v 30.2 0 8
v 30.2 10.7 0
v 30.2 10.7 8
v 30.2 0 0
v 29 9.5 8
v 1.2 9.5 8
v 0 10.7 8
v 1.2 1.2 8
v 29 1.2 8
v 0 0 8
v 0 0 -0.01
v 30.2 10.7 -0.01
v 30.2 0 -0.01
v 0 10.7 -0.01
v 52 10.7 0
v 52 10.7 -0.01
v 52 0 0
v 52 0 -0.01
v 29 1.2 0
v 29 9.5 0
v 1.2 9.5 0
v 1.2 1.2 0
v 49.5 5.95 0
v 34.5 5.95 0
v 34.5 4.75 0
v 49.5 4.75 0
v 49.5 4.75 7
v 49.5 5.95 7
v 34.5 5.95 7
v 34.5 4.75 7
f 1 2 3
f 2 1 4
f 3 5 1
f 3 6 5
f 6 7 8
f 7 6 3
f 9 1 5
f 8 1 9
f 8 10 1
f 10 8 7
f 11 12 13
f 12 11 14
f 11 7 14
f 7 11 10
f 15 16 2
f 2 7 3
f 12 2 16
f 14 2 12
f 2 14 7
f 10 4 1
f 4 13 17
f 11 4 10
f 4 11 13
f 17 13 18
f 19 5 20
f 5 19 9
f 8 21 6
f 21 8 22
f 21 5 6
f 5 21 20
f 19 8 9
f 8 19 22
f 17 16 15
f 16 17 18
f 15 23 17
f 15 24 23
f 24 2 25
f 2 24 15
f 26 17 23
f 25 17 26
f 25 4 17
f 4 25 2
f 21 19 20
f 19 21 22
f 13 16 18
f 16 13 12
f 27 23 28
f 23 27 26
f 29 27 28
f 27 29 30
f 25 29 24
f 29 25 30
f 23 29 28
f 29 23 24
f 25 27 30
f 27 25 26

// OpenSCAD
// file: ../Base/Boxes.scad
// Fischertechnik Box Foundation
// Pre-designed Boxes

use <Constants.scad>

include <PlacementOptions.scad>

box190Width = 190;
box190Depth = 130;
box130Width = 130;
box130Depth = 95;
boxUsageHeight = 33.9;
boxWallThickness = 2.4;
boxBaseThickness = 1.0;
boxWebWidth = 3.0;

// getBoxWallThickness()
// Gets the wall thickness of a Fischertechnik Box

function getBoxWallThickness() = boxWallThickness;

// Gets the usable height of a fischertechnik box
function getBoxUsageHeight() = boxUsageHeight;

// Gets the thickness of the Fischertechnik box base.
function getBoxBaseThickness() = boxBaseThickness;

// Gets the width of a box web
function getBoxWebWidth() = boxWebWidth;

// Gets the usable inner space of a Box 190 as an x/y-list
function getBox190Space() = [
    box190Width - 2*getBoxWallThickness(), 
    box190Depth - 2*getBoxWallThickness() ];

// Imports the Fischertechnik empty box 130x190 mm and places it at position 0,0
// 190x130 are the outer sizes, the inner space is slightly smaller. Use getBox190Space() to get the inner sizes.
// This module needs the STL file "Fischertechnik Box 130x190.stl" in the library path.
// The box is positioned that the usable inner space is at the 0,0,0 position. The

module Box190() {
    translate([-getBoxWallThickness(),-getBoxWallThickness(),-getBoxBaseThickness()])
        import("Fischertechnik Box 130x190.stl", convexity=3);
}

// Gets the usable inner space of a Box 130 as an x/y-list
function getBox130Space() = [
    box130Width - 2*getBoxWallThickness(), 
    box130Depth - 2*getBoxWallThickness() ];

// Imports the Fischertechnik empty box 95x130 mm and places it at position 0,0
// 190x130 are the outer sizes, the inner space is slightly smaller. Use getBox190Space() to get the inner sizes.
// This module needs the STL file "Fischertechnik Box 95x130.stl" in the library path.
// The box is positioned that the usable inner space is at the 0,0,0 position. The

module Box130() {
    translate([-getBoxWallThickness(),-getBoxWallThickness(),-getBoxBaseThickness()])
        import("Fischertechnik Box 95x130.stl", convexity=3);
}

// Creates a web at the specified box walls
// corner 0 = LowerLeft, 1 = UpperLeft, 2 = UpperRight, 3 = LowerRight
// side 0 = LeftOfCorner, 1 = RightOfCorner
// distance = Distance in mm from the corner
// box = inner width and depth of the box (default: Box 190)
// webWidth = length of the web (default is 3 mms)
// webThickness = thickness of the web (default is 1 mm)

module BoxWeb(corner, side, distance, box=getBox190Space(), webWidth=getBoxWebWidth(), webThickness=1.0) {
    sink = getBoxWallThickness()/2;

    width = (corner % 2 == 0) ? 
            (side == LeftOfCorner ? webWidth : webThickness) :
            (side == LeftOfCorner ? webThickness : webWidth);

    depth = (corner % 2 == 0) ? 
            (side == RightOfCorner ? webWidth : webThickness) :
            (side == RightOfCorner ? webThickness : webWidth);
    
    xDiff = corner == LowerLeft ? 
                (side == LeftOfCorner ? -sink : distance) :
            (corner == UpperLeft ?                
                (side == LeftOfCorner ? distance : -sink) :
            (corner == UpperRight ?
                (side == LeftOfCorner ? box.x-webWidth+sink : box.x-distance-webThickness) :
                (side == LeftOfCorner ? box.x-distance-webThickness: box.x-webWidth+sink)));

    yDiff = corner == LowerLeft ? 
                (side == RightOfCorner ? -sink : distance) :
            (corner == UpperLeft ?
                (side == RightOfCorner ? box.y-distance : box.y-webWidth+sink) :
            (corner == UpperRight ?
                (side == RightOfCorner ? box.y-webWidth+sink : box.y-distance) :
                (side == RightOfCorner ? distance : -sink)));
    
    translate([xDiff, yDiff, -getExcess()])
        cube([width, depth, boxUsageHeight + 2*getExcess()]);
}
// file: ../Base/Rotation.scad
// Fischertechnik Box Foundation
// Geometry Helpers Rotation

include <PlacementOptions.scad>

// getRotatedSpace(space, rotation=NoRotation)
// Rotates the space dependent on the specified rotation

function getRotatedSpace(space, rotation=NoRotation) = [
    (rotation == Rotate90 || rotation == Rotate270) ? space.y : space.x,
    (rotation == Rotate90 || rotation == Rotate270) ? space.x : space.y
];

// Rotates the given space around the fixed left lower corner
// space = the space the children needs as width/depth list [width,depth]
// rotation = 0 Rotate0 degrees, 1 Rotate90 degrees, 2 Rotate180 degrees, 3 Rotate270 degrees (equivalent to -90)

module RotateFix(space, rotation=NoRotation) {
    dy = (rotation == Rotate0 || rotation == Rotate270) ? 0 :
        (rotation == Rotate90) ? space.x :
        space.y;
    dx = (rotation < Rotate180) ? 0 :
        (rotation == Rotate180) ? space.x :
        space.y;
    
    translate([dx, dy, 0])
        rotate([0, 0, rotations[rotation]])
            children();
}
// file: ../Base/Alignment.scad
// Fischertechnik Box Foundation
// Geometry Helpers Alignment

include <PlacementOptions.scad>

// getAlignedX(elementWidth, spaceWidth, align=AlignRight, offset=0)
// Gets the aligned X offset of an element with the given
// width in the given space.
// elementWidth = The width of the element to positon
// spaceWidth = The space where the element should be aligned
// align = 0 AlignLeft, 1 AlignCenter, 2 AlignRight
// offset = an optional offset from the aligned position. When
// aligned left or centered, then positive values are in X direction.
// When aligned right then positive values are in negative X direction.

function getAlignedX(elementWidth, spaceWidth, align=AlignRight, offset=0) =
    (align == AlignLeft) ?
        offset :
        ((align == AlignCenter) ?
        (spaceWidth - elementWidth)/2 + offset :
        spaceWidth - offset - elementWidth);

// getAlignedY(elementDepth, spaceDepth, align=AlignTop, offset=0)
// Gets the aligned Y offset of an element with the given
// depth in the given space.
// elementDepth = The depth of the element to positon
// spaceDepth = The space where the element should be aligned
// align = 0 AlignBottom, 1 AlignCenter, 2 AlignTop
// offset = an optional offset from the aligned position. When
// aligned bottom or centered, then positive values are in Y direction.
// When aligned top then positive values are in negative Y direction.

function getAlignedY(elementDepth, spaceDepth, align=AlignTop, offset=0) =
    (align == AlignBottom) ?
        offset :
        ((align == AlignCenter) ?
        (spaceDepth - elementDepth)/2 + offset :
        spaceDepth - offset - elementDepth);
// file: ../Base/PlacementOptions.scad
// Fischertechnik Box Foundation
// Placement Options

// Alignment
NoAlign = 0;
AlignLeft = 1;
AlignBottom = 2;
AlignCenter = 3;
AlignRight = 4;
AlignTop = 5;

// Element rotation degree steps
rotations = [0, -90, -180, -270];

// Rotation
NoRotation = 0;
Rotate0 = 0;
Rotate90 = 1;
Rotate180 = 2;
Rotate270 = 3;

// Docking (seen from above)
NoDock = -1;
DockLeft = 0;
DockTop = 1;
DockRight = 2;
DockCorner = 2;
DockBottom = 3;

// Web corners
LowerLeft = 0;
UpperLeft = 1;
UpperRight = 2;
LowerRight = 3;

// Web position relative to corner
LeftOfCorner = 0;
RightOfCorner = 1;
// file: ../Base/Placement.scad
// Fischertechnik Box Foundation
// Geometry Helpers Placement

use <Constants.scad>
use <Alignment.scad>
use <Rotation.scad>
use <Boxes.scad>

include <PlacementOptions.scad>

// Place(x=0, y=0, elementSpace=[0,0], alignX=AlignLeft, alignY=AlignBottom, rotation=Rotate0, boxSpace=getBox190Space())
// Places the child at the specified position
// y = Y-Position. This is a relative position when an X aligment is specified.
// x = X-Position. This is a relative position when an Y aligment is specified.
// elementSpace = space of the element to be placed [x,y]
// alignX = -1=NoAlign, 0 AlignLeft, 1 AlignCenter, 3 AlignRight (elementSpace and boxSpace required!)
// alignY = -1=NoAlign, 2 AlignBottom, 1 AlignCenter, 4 AlignTop (elementSpace and boxSpace required!)
// rotation = 0 Rotate0 0 degrees, 1 Rotate90 90 degrees, 
// 2 Rotate180 180 degrees, 3 Rotate270 270 degrees (equivalent to -90)
// boxSpace = Inner space of the box where the placement occurs [x,y] - default is Box 190x130 inner space

module Place(x=0, y=0, elementSpace=[0,0], 
  alignX=AlignLeft, alignY=AlignBottom, 
  rotation=NoRotation, boxSpace=getBox190Space()) {

    module Position(x, y, space, rotation=Rotate0) {
        translate([x, y, 0])
            RotateFix(space, rotation)
                children();
    }

    space = getRotatedSpace(elementSpace, rotation);
    alignedX = getAlignedX(space.x, boxSpace.x, alignX, x);
    alignedY = getAlignedY(space.y, boxSpace.y, alignY, y);
    Position(alignedX, alignedY, elementSpace, rotation)
        children();
}

// Center(space=getBox130Space(), elementSpace=[0,0])
// space = Space where the children is centered. For cylinder use centered=true and no elementSpace.
// elementSpace = space of the element to be centered [x,y]

module Center(space=getBox190Space(), elementSpace=[0,0]) {
    translate([(space.x - elementSpace.x) / 2, (space.y - elementSpace.y) / 2])
        children(0);
}

// CenterHorizontal(width=0, y=0, offset=0, space=getBox130Space())
// space = Space where the children is centered. For cylinder use centered=true and no elementSpace.
// elementSpace = space of the element to be centered [x,y]

module CenterHorizontal(width=0, y=0, offset=0, space=getBox190Space()) {
    translate([(space.x - width) / 2 + offset, y])
        children(0);
}

// CenterVertical(depth=0, x=0, offset=0, space=getBox130Space())
// space = Space where the children is centered. For cylinder use centered=true and no elementSpace.
// elementSpace = space of the element to be centered [x,y]

module CenterVertical(depth=0, x=0, offset=0, space=getBox190Space()) {
    translate([x, (space.y - depth) / 2 + offset])
        children(0);
}
// file: ../Base/Constants.scad
// Fischertechnik Box Foundation
// Constants

// Constant values necessary for multiple elements

// Base constants
dividerThickness = 1.2;
excess = 0.01;
fragments = 90;
tolerance = 0.8;

// Gets the thickness of a divider 
function getDividerThickness() = dividerThickness;

// Gets the excess that is used to merge walls into each other
function getExcess() = excess;

// Gets amount of fragments of a cylinder
function getFragments() = fragments;

// Gets the inner tolerance of a frame to each side
function getTolerance() = tolerance;


// Fischertechnik specific constants
axisDiameter = 4;
axisBottomDiameter = axisDiameter + 1;
axisTolerance = 0.2;
axisLockingLength = 8;

// Gets axis diameter of Fischertechnik axis
function getAxisDiameter() = axisDiameter;

// Gets axis diameter tolerance (subtracted for element axis)
function getAxisTolerance() = axisTolerance;

// Gets the axis diameter for standing axis
function getStandAxisDiameter() = getAxisDiameter() - getAxisTolerance();

// Gets axis bottom diameter for thicker part at the bottom
function getAxisBottomDiameter() = axisBottomDiameter;

// Gets the lengthh of the locking part of a locking axis
function getAxisLockingLength() = axisLockingLength;

// Studs

studHeight = 2.5;
studTolerance = 0.2;
studRailDistance = 9;   // as in ft 50

// gets the height of a connecting stud
function getStudHeight() = studHeight;

// gets the connecting stud height tolerance
function getStudTolerance() = studTolerance;

// gets the default rail distance for studs
function getStudRailDistance() = studRailDistance;

// Dockable Frame with Edge

standardEdgeDistance = 2.5;
standardWebDistance = 11.5;
standardCornerLength = 15;

// gets the standard distance to the wall of the box for dockable frames with webs
function getStandardEdgeDistance() = standardEdgeDistance;

// gets the standard distance of each web to the corner of the dockable frame
function getStandardWebDistance() = standardWebDistance;

// gets the standard length of the corner walls of a dockable frame
function getStandardCornerLength() = standardCornerLength;

// Tubes

tubeWallFactor = 0.8;

// gets the wall thickness of a tube.
function getTubeWallThickness() = tubeWallFactor * getDividerThickness();

// Small Parts and Divider Frame

smallPartsFrameHeight = 20;

// gets the frame height for docked small parts boxes.
function getSmallPartsFrameHeight() = smallPartsFrameHeight;

// Hubs

hubRingDiameter = 19.5;
hubRingLevelDiameter = 21;

// gets the diameter of a tube matching the inner ring of a wheel
function getHubRingDiameter() = hubRingDiameter;

// gets the diameter of a hub tube with a thicker diameter
function getHubRingLevelDiameter() = hubRingLevelDiameter;

// Struts

strutAddLength = 9.0;
strutDepth = 8.0;
strutThickness = 2.8;
strutOuterTolerance = 0.6;

// gets the full length of a strut (nominal length plus 2x radius at the ends)
function getFullStrutLength(length) = length + strutAddLength;

// gets the radius of the end of a strut
function getStrutEndRadius() = strutAddLength / 2;

// gets the the depth (width) of a strut
function getStrutDepth() = strutDepth;

// gets the the thickness of a strut
function getStrutThickness() = strutThickness;

// gets the tolerance added to the strut sizes for strut holders
function getStrutOuterTolerance() = strutOuterTolerance;

// Propeller

propellerAxisDiameter = 7.0;
propellerAxisTolerance = 0.2;

// gets the propeller axis outer diameter
function getPropellerAxisDiameter() = propellerAxisDiameter;

// gets the propeller axis printing tolerance
function getPropellerAxisTolerance() = propellerAxisTolerance;
// main file
// Fischertechnik Box Library
// Frame  for bracket with worm
// 31045

use <../Base/Constants.scad>
use <../ModelBase/Complex.scad>

// getFrameBracketWithWormSpace()
// Gets the space for a frame for a bracket with worm.

function getFrameBracketWithWormSpace() = getFrameBracketSpace();

// FrameBracketWithWorm()
// Frame for bracket with worm.

module FrameBracketWithWorm() {
    FrameBracket([ 15, getDividerThickness(), 7 ]);
}

// Test
color("lightgray")
FrameBracketWithWorm();
